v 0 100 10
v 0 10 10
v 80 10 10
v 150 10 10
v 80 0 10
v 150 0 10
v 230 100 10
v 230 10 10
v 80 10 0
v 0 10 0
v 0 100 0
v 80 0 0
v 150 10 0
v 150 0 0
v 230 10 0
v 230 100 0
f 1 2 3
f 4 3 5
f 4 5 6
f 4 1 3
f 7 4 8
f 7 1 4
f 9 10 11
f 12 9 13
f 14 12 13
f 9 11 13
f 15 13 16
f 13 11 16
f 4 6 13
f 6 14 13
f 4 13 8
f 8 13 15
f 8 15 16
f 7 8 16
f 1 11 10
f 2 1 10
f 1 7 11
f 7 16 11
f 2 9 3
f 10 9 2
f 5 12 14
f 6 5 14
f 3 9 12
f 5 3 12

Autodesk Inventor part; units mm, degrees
ref_plane "YZ Plane" through (0, 0, 0) normal (1, 0, 0) x (0, 1, 0)
ref_plane "XZ Plane" through (0, 0, 0) normal (0, 1, 0) x (-1, 0, 0)
ref_plane "XY Plane" through (0, 0, 0) normal (0, 0, 1) x (1, 0, 0)
sketch "Sketch1" plane through (0, 0, 0) normal (0, 0, 1) x (1, 0, 0)
  line L0 (80, 0) -> (150, 0)
  line L1 (230, 10) -> (230, 100)
  line L2 (230, 100) -> (0, 100)
  line L3 (0, 100) -> (0, 10)
  line L4 (80, 0) -> (150, 0)
  line L5 (150, 0) -> (150, 10)
  line L6 (80, 10) -> (80, 0)
  line L7 (80, 10) -> (0, 10)
  line L8 (150, 10) -> (230, 10)
  dimension "d9" = 230
  dimension "d13" = 100
  dimension "d14" = 10
extrude "Extrusion1" add sketch "Sketch1" along normal blind 10
properties part number "front"
